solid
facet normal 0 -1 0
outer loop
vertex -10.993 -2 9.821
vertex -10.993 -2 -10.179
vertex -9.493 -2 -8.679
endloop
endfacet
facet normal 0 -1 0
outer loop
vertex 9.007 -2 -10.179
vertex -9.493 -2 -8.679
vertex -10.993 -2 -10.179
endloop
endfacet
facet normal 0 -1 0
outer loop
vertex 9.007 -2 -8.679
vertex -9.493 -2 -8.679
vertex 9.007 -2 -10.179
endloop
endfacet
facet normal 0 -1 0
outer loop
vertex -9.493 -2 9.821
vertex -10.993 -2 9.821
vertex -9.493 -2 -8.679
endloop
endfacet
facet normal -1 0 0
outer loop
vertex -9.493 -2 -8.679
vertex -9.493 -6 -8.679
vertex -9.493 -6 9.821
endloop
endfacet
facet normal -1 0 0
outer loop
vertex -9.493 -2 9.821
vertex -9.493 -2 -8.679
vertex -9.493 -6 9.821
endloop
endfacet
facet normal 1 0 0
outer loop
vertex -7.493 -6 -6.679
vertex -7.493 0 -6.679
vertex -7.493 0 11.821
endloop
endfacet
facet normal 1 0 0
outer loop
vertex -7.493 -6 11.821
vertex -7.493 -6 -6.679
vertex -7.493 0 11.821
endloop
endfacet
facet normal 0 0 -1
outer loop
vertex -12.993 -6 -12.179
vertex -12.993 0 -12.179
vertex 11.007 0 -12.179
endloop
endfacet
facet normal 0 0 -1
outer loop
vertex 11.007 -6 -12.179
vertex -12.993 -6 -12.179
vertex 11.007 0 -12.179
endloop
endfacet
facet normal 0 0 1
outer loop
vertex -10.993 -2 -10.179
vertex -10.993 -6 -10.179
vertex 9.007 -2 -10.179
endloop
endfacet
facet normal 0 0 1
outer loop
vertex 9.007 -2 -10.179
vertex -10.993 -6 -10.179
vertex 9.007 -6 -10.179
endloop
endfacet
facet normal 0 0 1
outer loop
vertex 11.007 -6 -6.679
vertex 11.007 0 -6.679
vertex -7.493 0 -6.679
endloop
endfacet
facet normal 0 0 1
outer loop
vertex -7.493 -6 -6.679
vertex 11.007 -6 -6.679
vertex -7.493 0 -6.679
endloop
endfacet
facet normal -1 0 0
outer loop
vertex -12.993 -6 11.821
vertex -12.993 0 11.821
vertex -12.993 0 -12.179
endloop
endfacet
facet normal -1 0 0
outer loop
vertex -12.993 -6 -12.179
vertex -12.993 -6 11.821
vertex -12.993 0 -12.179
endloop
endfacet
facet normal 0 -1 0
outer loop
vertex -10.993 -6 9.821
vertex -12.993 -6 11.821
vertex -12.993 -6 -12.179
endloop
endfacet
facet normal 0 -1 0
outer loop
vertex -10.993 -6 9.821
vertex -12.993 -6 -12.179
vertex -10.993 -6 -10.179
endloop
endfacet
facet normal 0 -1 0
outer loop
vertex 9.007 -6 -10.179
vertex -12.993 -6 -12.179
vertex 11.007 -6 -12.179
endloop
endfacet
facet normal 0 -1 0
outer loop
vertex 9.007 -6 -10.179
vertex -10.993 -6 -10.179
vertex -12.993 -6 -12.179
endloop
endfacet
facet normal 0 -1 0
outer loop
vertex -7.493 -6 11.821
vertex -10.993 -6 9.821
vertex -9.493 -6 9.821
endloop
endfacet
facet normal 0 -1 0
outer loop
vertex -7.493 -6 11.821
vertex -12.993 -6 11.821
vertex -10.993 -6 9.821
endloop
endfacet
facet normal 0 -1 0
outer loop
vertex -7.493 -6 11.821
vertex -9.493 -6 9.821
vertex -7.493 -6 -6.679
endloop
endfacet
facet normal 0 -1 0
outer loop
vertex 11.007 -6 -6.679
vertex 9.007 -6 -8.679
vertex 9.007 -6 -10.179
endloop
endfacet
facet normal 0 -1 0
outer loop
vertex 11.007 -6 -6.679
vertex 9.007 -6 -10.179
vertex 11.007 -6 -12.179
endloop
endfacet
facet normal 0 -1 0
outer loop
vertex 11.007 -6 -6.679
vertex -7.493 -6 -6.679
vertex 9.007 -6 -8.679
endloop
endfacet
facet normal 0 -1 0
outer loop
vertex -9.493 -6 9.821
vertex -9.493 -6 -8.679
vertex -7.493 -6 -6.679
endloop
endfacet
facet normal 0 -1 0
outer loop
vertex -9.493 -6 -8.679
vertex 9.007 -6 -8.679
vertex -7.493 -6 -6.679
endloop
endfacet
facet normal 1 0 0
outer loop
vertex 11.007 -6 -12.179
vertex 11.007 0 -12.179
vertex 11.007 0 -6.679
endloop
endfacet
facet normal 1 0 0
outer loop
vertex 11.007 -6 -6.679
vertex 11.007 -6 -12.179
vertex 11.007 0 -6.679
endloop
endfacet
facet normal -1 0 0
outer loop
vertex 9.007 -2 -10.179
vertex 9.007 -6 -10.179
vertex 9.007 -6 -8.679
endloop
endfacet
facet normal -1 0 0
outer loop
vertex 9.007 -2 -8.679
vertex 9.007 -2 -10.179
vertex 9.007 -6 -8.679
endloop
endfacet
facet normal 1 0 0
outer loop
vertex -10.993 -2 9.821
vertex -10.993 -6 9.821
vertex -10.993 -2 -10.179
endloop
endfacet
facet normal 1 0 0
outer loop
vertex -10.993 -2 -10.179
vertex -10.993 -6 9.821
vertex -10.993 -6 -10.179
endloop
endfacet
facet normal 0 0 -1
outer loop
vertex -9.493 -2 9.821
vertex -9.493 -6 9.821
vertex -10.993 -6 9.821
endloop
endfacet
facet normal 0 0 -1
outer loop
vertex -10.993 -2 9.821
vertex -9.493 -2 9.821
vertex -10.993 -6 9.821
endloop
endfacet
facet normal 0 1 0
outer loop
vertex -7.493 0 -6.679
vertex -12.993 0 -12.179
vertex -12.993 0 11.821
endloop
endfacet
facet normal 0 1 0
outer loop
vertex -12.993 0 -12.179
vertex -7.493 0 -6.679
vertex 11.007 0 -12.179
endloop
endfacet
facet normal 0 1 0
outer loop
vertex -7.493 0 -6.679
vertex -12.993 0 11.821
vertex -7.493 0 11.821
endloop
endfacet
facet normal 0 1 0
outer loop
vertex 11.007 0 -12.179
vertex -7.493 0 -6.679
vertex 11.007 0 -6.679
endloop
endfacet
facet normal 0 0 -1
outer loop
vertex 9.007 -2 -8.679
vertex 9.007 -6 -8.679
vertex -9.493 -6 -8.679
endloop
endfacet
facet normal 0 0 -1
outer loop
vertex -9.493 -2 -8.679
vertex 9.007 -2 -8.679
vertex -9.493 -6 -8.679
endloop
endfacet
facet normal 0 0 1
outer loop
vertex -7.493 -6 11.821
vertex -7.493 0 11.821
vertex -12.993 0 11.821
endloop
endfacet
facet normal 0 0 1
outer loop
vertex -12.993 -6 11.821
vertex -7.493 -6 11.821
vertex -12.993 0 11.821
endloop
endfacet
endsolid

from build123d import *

# Parameters (mm, degrees)
EXTRUDE_DEPTH                     = 6
EXTRUDE_ONTO_SKETCH001_ROLL_ANGLE = 90
POCKET_DEPTH                      = 4


with BuildPart() as part:
    # Sketch001 as drawn → Extrude (new)
    with BuildSketch(Plane.XY):
        Polygon((-12.993358, 11.821226), (-12.993358, -12.178774), (11.006642, -12.178774), (11.006642, -6.678774), (-7.493358, -6.678774), (-7.493358, 11.821226), align=None)
    extrude(amount=EXTRUDE_DEPTH)


with BuildPart() as part_1:
    # Extrude onto Sketch001 roll: moved
    add(part.part.rotate(Axis((0, 0, 0), (1, 0, 0)), EXTRUDE_ONTO_SKETCH001_ROLL_ANGLE))


with BuildPart() as part_2:
    # Extrude onto Sketch001 placement: moved
    add(part_1.part)

    # Sketch002 → Pocket (cut)
    with BuildSketch(Plane.XZ.offset(6)):
        Polygon((-10.993358, 9.821226), (-10.993358, -10.178774), (9.006642, -10.178774), (9.006642, -8.678774), (-9.493358, -8.678774), (-9.493358, 9.821226), align=None)
    extrude(amount=-POCKET_DEPTH, mode=Mode.SUBTRACT)


solid = part_2.part
